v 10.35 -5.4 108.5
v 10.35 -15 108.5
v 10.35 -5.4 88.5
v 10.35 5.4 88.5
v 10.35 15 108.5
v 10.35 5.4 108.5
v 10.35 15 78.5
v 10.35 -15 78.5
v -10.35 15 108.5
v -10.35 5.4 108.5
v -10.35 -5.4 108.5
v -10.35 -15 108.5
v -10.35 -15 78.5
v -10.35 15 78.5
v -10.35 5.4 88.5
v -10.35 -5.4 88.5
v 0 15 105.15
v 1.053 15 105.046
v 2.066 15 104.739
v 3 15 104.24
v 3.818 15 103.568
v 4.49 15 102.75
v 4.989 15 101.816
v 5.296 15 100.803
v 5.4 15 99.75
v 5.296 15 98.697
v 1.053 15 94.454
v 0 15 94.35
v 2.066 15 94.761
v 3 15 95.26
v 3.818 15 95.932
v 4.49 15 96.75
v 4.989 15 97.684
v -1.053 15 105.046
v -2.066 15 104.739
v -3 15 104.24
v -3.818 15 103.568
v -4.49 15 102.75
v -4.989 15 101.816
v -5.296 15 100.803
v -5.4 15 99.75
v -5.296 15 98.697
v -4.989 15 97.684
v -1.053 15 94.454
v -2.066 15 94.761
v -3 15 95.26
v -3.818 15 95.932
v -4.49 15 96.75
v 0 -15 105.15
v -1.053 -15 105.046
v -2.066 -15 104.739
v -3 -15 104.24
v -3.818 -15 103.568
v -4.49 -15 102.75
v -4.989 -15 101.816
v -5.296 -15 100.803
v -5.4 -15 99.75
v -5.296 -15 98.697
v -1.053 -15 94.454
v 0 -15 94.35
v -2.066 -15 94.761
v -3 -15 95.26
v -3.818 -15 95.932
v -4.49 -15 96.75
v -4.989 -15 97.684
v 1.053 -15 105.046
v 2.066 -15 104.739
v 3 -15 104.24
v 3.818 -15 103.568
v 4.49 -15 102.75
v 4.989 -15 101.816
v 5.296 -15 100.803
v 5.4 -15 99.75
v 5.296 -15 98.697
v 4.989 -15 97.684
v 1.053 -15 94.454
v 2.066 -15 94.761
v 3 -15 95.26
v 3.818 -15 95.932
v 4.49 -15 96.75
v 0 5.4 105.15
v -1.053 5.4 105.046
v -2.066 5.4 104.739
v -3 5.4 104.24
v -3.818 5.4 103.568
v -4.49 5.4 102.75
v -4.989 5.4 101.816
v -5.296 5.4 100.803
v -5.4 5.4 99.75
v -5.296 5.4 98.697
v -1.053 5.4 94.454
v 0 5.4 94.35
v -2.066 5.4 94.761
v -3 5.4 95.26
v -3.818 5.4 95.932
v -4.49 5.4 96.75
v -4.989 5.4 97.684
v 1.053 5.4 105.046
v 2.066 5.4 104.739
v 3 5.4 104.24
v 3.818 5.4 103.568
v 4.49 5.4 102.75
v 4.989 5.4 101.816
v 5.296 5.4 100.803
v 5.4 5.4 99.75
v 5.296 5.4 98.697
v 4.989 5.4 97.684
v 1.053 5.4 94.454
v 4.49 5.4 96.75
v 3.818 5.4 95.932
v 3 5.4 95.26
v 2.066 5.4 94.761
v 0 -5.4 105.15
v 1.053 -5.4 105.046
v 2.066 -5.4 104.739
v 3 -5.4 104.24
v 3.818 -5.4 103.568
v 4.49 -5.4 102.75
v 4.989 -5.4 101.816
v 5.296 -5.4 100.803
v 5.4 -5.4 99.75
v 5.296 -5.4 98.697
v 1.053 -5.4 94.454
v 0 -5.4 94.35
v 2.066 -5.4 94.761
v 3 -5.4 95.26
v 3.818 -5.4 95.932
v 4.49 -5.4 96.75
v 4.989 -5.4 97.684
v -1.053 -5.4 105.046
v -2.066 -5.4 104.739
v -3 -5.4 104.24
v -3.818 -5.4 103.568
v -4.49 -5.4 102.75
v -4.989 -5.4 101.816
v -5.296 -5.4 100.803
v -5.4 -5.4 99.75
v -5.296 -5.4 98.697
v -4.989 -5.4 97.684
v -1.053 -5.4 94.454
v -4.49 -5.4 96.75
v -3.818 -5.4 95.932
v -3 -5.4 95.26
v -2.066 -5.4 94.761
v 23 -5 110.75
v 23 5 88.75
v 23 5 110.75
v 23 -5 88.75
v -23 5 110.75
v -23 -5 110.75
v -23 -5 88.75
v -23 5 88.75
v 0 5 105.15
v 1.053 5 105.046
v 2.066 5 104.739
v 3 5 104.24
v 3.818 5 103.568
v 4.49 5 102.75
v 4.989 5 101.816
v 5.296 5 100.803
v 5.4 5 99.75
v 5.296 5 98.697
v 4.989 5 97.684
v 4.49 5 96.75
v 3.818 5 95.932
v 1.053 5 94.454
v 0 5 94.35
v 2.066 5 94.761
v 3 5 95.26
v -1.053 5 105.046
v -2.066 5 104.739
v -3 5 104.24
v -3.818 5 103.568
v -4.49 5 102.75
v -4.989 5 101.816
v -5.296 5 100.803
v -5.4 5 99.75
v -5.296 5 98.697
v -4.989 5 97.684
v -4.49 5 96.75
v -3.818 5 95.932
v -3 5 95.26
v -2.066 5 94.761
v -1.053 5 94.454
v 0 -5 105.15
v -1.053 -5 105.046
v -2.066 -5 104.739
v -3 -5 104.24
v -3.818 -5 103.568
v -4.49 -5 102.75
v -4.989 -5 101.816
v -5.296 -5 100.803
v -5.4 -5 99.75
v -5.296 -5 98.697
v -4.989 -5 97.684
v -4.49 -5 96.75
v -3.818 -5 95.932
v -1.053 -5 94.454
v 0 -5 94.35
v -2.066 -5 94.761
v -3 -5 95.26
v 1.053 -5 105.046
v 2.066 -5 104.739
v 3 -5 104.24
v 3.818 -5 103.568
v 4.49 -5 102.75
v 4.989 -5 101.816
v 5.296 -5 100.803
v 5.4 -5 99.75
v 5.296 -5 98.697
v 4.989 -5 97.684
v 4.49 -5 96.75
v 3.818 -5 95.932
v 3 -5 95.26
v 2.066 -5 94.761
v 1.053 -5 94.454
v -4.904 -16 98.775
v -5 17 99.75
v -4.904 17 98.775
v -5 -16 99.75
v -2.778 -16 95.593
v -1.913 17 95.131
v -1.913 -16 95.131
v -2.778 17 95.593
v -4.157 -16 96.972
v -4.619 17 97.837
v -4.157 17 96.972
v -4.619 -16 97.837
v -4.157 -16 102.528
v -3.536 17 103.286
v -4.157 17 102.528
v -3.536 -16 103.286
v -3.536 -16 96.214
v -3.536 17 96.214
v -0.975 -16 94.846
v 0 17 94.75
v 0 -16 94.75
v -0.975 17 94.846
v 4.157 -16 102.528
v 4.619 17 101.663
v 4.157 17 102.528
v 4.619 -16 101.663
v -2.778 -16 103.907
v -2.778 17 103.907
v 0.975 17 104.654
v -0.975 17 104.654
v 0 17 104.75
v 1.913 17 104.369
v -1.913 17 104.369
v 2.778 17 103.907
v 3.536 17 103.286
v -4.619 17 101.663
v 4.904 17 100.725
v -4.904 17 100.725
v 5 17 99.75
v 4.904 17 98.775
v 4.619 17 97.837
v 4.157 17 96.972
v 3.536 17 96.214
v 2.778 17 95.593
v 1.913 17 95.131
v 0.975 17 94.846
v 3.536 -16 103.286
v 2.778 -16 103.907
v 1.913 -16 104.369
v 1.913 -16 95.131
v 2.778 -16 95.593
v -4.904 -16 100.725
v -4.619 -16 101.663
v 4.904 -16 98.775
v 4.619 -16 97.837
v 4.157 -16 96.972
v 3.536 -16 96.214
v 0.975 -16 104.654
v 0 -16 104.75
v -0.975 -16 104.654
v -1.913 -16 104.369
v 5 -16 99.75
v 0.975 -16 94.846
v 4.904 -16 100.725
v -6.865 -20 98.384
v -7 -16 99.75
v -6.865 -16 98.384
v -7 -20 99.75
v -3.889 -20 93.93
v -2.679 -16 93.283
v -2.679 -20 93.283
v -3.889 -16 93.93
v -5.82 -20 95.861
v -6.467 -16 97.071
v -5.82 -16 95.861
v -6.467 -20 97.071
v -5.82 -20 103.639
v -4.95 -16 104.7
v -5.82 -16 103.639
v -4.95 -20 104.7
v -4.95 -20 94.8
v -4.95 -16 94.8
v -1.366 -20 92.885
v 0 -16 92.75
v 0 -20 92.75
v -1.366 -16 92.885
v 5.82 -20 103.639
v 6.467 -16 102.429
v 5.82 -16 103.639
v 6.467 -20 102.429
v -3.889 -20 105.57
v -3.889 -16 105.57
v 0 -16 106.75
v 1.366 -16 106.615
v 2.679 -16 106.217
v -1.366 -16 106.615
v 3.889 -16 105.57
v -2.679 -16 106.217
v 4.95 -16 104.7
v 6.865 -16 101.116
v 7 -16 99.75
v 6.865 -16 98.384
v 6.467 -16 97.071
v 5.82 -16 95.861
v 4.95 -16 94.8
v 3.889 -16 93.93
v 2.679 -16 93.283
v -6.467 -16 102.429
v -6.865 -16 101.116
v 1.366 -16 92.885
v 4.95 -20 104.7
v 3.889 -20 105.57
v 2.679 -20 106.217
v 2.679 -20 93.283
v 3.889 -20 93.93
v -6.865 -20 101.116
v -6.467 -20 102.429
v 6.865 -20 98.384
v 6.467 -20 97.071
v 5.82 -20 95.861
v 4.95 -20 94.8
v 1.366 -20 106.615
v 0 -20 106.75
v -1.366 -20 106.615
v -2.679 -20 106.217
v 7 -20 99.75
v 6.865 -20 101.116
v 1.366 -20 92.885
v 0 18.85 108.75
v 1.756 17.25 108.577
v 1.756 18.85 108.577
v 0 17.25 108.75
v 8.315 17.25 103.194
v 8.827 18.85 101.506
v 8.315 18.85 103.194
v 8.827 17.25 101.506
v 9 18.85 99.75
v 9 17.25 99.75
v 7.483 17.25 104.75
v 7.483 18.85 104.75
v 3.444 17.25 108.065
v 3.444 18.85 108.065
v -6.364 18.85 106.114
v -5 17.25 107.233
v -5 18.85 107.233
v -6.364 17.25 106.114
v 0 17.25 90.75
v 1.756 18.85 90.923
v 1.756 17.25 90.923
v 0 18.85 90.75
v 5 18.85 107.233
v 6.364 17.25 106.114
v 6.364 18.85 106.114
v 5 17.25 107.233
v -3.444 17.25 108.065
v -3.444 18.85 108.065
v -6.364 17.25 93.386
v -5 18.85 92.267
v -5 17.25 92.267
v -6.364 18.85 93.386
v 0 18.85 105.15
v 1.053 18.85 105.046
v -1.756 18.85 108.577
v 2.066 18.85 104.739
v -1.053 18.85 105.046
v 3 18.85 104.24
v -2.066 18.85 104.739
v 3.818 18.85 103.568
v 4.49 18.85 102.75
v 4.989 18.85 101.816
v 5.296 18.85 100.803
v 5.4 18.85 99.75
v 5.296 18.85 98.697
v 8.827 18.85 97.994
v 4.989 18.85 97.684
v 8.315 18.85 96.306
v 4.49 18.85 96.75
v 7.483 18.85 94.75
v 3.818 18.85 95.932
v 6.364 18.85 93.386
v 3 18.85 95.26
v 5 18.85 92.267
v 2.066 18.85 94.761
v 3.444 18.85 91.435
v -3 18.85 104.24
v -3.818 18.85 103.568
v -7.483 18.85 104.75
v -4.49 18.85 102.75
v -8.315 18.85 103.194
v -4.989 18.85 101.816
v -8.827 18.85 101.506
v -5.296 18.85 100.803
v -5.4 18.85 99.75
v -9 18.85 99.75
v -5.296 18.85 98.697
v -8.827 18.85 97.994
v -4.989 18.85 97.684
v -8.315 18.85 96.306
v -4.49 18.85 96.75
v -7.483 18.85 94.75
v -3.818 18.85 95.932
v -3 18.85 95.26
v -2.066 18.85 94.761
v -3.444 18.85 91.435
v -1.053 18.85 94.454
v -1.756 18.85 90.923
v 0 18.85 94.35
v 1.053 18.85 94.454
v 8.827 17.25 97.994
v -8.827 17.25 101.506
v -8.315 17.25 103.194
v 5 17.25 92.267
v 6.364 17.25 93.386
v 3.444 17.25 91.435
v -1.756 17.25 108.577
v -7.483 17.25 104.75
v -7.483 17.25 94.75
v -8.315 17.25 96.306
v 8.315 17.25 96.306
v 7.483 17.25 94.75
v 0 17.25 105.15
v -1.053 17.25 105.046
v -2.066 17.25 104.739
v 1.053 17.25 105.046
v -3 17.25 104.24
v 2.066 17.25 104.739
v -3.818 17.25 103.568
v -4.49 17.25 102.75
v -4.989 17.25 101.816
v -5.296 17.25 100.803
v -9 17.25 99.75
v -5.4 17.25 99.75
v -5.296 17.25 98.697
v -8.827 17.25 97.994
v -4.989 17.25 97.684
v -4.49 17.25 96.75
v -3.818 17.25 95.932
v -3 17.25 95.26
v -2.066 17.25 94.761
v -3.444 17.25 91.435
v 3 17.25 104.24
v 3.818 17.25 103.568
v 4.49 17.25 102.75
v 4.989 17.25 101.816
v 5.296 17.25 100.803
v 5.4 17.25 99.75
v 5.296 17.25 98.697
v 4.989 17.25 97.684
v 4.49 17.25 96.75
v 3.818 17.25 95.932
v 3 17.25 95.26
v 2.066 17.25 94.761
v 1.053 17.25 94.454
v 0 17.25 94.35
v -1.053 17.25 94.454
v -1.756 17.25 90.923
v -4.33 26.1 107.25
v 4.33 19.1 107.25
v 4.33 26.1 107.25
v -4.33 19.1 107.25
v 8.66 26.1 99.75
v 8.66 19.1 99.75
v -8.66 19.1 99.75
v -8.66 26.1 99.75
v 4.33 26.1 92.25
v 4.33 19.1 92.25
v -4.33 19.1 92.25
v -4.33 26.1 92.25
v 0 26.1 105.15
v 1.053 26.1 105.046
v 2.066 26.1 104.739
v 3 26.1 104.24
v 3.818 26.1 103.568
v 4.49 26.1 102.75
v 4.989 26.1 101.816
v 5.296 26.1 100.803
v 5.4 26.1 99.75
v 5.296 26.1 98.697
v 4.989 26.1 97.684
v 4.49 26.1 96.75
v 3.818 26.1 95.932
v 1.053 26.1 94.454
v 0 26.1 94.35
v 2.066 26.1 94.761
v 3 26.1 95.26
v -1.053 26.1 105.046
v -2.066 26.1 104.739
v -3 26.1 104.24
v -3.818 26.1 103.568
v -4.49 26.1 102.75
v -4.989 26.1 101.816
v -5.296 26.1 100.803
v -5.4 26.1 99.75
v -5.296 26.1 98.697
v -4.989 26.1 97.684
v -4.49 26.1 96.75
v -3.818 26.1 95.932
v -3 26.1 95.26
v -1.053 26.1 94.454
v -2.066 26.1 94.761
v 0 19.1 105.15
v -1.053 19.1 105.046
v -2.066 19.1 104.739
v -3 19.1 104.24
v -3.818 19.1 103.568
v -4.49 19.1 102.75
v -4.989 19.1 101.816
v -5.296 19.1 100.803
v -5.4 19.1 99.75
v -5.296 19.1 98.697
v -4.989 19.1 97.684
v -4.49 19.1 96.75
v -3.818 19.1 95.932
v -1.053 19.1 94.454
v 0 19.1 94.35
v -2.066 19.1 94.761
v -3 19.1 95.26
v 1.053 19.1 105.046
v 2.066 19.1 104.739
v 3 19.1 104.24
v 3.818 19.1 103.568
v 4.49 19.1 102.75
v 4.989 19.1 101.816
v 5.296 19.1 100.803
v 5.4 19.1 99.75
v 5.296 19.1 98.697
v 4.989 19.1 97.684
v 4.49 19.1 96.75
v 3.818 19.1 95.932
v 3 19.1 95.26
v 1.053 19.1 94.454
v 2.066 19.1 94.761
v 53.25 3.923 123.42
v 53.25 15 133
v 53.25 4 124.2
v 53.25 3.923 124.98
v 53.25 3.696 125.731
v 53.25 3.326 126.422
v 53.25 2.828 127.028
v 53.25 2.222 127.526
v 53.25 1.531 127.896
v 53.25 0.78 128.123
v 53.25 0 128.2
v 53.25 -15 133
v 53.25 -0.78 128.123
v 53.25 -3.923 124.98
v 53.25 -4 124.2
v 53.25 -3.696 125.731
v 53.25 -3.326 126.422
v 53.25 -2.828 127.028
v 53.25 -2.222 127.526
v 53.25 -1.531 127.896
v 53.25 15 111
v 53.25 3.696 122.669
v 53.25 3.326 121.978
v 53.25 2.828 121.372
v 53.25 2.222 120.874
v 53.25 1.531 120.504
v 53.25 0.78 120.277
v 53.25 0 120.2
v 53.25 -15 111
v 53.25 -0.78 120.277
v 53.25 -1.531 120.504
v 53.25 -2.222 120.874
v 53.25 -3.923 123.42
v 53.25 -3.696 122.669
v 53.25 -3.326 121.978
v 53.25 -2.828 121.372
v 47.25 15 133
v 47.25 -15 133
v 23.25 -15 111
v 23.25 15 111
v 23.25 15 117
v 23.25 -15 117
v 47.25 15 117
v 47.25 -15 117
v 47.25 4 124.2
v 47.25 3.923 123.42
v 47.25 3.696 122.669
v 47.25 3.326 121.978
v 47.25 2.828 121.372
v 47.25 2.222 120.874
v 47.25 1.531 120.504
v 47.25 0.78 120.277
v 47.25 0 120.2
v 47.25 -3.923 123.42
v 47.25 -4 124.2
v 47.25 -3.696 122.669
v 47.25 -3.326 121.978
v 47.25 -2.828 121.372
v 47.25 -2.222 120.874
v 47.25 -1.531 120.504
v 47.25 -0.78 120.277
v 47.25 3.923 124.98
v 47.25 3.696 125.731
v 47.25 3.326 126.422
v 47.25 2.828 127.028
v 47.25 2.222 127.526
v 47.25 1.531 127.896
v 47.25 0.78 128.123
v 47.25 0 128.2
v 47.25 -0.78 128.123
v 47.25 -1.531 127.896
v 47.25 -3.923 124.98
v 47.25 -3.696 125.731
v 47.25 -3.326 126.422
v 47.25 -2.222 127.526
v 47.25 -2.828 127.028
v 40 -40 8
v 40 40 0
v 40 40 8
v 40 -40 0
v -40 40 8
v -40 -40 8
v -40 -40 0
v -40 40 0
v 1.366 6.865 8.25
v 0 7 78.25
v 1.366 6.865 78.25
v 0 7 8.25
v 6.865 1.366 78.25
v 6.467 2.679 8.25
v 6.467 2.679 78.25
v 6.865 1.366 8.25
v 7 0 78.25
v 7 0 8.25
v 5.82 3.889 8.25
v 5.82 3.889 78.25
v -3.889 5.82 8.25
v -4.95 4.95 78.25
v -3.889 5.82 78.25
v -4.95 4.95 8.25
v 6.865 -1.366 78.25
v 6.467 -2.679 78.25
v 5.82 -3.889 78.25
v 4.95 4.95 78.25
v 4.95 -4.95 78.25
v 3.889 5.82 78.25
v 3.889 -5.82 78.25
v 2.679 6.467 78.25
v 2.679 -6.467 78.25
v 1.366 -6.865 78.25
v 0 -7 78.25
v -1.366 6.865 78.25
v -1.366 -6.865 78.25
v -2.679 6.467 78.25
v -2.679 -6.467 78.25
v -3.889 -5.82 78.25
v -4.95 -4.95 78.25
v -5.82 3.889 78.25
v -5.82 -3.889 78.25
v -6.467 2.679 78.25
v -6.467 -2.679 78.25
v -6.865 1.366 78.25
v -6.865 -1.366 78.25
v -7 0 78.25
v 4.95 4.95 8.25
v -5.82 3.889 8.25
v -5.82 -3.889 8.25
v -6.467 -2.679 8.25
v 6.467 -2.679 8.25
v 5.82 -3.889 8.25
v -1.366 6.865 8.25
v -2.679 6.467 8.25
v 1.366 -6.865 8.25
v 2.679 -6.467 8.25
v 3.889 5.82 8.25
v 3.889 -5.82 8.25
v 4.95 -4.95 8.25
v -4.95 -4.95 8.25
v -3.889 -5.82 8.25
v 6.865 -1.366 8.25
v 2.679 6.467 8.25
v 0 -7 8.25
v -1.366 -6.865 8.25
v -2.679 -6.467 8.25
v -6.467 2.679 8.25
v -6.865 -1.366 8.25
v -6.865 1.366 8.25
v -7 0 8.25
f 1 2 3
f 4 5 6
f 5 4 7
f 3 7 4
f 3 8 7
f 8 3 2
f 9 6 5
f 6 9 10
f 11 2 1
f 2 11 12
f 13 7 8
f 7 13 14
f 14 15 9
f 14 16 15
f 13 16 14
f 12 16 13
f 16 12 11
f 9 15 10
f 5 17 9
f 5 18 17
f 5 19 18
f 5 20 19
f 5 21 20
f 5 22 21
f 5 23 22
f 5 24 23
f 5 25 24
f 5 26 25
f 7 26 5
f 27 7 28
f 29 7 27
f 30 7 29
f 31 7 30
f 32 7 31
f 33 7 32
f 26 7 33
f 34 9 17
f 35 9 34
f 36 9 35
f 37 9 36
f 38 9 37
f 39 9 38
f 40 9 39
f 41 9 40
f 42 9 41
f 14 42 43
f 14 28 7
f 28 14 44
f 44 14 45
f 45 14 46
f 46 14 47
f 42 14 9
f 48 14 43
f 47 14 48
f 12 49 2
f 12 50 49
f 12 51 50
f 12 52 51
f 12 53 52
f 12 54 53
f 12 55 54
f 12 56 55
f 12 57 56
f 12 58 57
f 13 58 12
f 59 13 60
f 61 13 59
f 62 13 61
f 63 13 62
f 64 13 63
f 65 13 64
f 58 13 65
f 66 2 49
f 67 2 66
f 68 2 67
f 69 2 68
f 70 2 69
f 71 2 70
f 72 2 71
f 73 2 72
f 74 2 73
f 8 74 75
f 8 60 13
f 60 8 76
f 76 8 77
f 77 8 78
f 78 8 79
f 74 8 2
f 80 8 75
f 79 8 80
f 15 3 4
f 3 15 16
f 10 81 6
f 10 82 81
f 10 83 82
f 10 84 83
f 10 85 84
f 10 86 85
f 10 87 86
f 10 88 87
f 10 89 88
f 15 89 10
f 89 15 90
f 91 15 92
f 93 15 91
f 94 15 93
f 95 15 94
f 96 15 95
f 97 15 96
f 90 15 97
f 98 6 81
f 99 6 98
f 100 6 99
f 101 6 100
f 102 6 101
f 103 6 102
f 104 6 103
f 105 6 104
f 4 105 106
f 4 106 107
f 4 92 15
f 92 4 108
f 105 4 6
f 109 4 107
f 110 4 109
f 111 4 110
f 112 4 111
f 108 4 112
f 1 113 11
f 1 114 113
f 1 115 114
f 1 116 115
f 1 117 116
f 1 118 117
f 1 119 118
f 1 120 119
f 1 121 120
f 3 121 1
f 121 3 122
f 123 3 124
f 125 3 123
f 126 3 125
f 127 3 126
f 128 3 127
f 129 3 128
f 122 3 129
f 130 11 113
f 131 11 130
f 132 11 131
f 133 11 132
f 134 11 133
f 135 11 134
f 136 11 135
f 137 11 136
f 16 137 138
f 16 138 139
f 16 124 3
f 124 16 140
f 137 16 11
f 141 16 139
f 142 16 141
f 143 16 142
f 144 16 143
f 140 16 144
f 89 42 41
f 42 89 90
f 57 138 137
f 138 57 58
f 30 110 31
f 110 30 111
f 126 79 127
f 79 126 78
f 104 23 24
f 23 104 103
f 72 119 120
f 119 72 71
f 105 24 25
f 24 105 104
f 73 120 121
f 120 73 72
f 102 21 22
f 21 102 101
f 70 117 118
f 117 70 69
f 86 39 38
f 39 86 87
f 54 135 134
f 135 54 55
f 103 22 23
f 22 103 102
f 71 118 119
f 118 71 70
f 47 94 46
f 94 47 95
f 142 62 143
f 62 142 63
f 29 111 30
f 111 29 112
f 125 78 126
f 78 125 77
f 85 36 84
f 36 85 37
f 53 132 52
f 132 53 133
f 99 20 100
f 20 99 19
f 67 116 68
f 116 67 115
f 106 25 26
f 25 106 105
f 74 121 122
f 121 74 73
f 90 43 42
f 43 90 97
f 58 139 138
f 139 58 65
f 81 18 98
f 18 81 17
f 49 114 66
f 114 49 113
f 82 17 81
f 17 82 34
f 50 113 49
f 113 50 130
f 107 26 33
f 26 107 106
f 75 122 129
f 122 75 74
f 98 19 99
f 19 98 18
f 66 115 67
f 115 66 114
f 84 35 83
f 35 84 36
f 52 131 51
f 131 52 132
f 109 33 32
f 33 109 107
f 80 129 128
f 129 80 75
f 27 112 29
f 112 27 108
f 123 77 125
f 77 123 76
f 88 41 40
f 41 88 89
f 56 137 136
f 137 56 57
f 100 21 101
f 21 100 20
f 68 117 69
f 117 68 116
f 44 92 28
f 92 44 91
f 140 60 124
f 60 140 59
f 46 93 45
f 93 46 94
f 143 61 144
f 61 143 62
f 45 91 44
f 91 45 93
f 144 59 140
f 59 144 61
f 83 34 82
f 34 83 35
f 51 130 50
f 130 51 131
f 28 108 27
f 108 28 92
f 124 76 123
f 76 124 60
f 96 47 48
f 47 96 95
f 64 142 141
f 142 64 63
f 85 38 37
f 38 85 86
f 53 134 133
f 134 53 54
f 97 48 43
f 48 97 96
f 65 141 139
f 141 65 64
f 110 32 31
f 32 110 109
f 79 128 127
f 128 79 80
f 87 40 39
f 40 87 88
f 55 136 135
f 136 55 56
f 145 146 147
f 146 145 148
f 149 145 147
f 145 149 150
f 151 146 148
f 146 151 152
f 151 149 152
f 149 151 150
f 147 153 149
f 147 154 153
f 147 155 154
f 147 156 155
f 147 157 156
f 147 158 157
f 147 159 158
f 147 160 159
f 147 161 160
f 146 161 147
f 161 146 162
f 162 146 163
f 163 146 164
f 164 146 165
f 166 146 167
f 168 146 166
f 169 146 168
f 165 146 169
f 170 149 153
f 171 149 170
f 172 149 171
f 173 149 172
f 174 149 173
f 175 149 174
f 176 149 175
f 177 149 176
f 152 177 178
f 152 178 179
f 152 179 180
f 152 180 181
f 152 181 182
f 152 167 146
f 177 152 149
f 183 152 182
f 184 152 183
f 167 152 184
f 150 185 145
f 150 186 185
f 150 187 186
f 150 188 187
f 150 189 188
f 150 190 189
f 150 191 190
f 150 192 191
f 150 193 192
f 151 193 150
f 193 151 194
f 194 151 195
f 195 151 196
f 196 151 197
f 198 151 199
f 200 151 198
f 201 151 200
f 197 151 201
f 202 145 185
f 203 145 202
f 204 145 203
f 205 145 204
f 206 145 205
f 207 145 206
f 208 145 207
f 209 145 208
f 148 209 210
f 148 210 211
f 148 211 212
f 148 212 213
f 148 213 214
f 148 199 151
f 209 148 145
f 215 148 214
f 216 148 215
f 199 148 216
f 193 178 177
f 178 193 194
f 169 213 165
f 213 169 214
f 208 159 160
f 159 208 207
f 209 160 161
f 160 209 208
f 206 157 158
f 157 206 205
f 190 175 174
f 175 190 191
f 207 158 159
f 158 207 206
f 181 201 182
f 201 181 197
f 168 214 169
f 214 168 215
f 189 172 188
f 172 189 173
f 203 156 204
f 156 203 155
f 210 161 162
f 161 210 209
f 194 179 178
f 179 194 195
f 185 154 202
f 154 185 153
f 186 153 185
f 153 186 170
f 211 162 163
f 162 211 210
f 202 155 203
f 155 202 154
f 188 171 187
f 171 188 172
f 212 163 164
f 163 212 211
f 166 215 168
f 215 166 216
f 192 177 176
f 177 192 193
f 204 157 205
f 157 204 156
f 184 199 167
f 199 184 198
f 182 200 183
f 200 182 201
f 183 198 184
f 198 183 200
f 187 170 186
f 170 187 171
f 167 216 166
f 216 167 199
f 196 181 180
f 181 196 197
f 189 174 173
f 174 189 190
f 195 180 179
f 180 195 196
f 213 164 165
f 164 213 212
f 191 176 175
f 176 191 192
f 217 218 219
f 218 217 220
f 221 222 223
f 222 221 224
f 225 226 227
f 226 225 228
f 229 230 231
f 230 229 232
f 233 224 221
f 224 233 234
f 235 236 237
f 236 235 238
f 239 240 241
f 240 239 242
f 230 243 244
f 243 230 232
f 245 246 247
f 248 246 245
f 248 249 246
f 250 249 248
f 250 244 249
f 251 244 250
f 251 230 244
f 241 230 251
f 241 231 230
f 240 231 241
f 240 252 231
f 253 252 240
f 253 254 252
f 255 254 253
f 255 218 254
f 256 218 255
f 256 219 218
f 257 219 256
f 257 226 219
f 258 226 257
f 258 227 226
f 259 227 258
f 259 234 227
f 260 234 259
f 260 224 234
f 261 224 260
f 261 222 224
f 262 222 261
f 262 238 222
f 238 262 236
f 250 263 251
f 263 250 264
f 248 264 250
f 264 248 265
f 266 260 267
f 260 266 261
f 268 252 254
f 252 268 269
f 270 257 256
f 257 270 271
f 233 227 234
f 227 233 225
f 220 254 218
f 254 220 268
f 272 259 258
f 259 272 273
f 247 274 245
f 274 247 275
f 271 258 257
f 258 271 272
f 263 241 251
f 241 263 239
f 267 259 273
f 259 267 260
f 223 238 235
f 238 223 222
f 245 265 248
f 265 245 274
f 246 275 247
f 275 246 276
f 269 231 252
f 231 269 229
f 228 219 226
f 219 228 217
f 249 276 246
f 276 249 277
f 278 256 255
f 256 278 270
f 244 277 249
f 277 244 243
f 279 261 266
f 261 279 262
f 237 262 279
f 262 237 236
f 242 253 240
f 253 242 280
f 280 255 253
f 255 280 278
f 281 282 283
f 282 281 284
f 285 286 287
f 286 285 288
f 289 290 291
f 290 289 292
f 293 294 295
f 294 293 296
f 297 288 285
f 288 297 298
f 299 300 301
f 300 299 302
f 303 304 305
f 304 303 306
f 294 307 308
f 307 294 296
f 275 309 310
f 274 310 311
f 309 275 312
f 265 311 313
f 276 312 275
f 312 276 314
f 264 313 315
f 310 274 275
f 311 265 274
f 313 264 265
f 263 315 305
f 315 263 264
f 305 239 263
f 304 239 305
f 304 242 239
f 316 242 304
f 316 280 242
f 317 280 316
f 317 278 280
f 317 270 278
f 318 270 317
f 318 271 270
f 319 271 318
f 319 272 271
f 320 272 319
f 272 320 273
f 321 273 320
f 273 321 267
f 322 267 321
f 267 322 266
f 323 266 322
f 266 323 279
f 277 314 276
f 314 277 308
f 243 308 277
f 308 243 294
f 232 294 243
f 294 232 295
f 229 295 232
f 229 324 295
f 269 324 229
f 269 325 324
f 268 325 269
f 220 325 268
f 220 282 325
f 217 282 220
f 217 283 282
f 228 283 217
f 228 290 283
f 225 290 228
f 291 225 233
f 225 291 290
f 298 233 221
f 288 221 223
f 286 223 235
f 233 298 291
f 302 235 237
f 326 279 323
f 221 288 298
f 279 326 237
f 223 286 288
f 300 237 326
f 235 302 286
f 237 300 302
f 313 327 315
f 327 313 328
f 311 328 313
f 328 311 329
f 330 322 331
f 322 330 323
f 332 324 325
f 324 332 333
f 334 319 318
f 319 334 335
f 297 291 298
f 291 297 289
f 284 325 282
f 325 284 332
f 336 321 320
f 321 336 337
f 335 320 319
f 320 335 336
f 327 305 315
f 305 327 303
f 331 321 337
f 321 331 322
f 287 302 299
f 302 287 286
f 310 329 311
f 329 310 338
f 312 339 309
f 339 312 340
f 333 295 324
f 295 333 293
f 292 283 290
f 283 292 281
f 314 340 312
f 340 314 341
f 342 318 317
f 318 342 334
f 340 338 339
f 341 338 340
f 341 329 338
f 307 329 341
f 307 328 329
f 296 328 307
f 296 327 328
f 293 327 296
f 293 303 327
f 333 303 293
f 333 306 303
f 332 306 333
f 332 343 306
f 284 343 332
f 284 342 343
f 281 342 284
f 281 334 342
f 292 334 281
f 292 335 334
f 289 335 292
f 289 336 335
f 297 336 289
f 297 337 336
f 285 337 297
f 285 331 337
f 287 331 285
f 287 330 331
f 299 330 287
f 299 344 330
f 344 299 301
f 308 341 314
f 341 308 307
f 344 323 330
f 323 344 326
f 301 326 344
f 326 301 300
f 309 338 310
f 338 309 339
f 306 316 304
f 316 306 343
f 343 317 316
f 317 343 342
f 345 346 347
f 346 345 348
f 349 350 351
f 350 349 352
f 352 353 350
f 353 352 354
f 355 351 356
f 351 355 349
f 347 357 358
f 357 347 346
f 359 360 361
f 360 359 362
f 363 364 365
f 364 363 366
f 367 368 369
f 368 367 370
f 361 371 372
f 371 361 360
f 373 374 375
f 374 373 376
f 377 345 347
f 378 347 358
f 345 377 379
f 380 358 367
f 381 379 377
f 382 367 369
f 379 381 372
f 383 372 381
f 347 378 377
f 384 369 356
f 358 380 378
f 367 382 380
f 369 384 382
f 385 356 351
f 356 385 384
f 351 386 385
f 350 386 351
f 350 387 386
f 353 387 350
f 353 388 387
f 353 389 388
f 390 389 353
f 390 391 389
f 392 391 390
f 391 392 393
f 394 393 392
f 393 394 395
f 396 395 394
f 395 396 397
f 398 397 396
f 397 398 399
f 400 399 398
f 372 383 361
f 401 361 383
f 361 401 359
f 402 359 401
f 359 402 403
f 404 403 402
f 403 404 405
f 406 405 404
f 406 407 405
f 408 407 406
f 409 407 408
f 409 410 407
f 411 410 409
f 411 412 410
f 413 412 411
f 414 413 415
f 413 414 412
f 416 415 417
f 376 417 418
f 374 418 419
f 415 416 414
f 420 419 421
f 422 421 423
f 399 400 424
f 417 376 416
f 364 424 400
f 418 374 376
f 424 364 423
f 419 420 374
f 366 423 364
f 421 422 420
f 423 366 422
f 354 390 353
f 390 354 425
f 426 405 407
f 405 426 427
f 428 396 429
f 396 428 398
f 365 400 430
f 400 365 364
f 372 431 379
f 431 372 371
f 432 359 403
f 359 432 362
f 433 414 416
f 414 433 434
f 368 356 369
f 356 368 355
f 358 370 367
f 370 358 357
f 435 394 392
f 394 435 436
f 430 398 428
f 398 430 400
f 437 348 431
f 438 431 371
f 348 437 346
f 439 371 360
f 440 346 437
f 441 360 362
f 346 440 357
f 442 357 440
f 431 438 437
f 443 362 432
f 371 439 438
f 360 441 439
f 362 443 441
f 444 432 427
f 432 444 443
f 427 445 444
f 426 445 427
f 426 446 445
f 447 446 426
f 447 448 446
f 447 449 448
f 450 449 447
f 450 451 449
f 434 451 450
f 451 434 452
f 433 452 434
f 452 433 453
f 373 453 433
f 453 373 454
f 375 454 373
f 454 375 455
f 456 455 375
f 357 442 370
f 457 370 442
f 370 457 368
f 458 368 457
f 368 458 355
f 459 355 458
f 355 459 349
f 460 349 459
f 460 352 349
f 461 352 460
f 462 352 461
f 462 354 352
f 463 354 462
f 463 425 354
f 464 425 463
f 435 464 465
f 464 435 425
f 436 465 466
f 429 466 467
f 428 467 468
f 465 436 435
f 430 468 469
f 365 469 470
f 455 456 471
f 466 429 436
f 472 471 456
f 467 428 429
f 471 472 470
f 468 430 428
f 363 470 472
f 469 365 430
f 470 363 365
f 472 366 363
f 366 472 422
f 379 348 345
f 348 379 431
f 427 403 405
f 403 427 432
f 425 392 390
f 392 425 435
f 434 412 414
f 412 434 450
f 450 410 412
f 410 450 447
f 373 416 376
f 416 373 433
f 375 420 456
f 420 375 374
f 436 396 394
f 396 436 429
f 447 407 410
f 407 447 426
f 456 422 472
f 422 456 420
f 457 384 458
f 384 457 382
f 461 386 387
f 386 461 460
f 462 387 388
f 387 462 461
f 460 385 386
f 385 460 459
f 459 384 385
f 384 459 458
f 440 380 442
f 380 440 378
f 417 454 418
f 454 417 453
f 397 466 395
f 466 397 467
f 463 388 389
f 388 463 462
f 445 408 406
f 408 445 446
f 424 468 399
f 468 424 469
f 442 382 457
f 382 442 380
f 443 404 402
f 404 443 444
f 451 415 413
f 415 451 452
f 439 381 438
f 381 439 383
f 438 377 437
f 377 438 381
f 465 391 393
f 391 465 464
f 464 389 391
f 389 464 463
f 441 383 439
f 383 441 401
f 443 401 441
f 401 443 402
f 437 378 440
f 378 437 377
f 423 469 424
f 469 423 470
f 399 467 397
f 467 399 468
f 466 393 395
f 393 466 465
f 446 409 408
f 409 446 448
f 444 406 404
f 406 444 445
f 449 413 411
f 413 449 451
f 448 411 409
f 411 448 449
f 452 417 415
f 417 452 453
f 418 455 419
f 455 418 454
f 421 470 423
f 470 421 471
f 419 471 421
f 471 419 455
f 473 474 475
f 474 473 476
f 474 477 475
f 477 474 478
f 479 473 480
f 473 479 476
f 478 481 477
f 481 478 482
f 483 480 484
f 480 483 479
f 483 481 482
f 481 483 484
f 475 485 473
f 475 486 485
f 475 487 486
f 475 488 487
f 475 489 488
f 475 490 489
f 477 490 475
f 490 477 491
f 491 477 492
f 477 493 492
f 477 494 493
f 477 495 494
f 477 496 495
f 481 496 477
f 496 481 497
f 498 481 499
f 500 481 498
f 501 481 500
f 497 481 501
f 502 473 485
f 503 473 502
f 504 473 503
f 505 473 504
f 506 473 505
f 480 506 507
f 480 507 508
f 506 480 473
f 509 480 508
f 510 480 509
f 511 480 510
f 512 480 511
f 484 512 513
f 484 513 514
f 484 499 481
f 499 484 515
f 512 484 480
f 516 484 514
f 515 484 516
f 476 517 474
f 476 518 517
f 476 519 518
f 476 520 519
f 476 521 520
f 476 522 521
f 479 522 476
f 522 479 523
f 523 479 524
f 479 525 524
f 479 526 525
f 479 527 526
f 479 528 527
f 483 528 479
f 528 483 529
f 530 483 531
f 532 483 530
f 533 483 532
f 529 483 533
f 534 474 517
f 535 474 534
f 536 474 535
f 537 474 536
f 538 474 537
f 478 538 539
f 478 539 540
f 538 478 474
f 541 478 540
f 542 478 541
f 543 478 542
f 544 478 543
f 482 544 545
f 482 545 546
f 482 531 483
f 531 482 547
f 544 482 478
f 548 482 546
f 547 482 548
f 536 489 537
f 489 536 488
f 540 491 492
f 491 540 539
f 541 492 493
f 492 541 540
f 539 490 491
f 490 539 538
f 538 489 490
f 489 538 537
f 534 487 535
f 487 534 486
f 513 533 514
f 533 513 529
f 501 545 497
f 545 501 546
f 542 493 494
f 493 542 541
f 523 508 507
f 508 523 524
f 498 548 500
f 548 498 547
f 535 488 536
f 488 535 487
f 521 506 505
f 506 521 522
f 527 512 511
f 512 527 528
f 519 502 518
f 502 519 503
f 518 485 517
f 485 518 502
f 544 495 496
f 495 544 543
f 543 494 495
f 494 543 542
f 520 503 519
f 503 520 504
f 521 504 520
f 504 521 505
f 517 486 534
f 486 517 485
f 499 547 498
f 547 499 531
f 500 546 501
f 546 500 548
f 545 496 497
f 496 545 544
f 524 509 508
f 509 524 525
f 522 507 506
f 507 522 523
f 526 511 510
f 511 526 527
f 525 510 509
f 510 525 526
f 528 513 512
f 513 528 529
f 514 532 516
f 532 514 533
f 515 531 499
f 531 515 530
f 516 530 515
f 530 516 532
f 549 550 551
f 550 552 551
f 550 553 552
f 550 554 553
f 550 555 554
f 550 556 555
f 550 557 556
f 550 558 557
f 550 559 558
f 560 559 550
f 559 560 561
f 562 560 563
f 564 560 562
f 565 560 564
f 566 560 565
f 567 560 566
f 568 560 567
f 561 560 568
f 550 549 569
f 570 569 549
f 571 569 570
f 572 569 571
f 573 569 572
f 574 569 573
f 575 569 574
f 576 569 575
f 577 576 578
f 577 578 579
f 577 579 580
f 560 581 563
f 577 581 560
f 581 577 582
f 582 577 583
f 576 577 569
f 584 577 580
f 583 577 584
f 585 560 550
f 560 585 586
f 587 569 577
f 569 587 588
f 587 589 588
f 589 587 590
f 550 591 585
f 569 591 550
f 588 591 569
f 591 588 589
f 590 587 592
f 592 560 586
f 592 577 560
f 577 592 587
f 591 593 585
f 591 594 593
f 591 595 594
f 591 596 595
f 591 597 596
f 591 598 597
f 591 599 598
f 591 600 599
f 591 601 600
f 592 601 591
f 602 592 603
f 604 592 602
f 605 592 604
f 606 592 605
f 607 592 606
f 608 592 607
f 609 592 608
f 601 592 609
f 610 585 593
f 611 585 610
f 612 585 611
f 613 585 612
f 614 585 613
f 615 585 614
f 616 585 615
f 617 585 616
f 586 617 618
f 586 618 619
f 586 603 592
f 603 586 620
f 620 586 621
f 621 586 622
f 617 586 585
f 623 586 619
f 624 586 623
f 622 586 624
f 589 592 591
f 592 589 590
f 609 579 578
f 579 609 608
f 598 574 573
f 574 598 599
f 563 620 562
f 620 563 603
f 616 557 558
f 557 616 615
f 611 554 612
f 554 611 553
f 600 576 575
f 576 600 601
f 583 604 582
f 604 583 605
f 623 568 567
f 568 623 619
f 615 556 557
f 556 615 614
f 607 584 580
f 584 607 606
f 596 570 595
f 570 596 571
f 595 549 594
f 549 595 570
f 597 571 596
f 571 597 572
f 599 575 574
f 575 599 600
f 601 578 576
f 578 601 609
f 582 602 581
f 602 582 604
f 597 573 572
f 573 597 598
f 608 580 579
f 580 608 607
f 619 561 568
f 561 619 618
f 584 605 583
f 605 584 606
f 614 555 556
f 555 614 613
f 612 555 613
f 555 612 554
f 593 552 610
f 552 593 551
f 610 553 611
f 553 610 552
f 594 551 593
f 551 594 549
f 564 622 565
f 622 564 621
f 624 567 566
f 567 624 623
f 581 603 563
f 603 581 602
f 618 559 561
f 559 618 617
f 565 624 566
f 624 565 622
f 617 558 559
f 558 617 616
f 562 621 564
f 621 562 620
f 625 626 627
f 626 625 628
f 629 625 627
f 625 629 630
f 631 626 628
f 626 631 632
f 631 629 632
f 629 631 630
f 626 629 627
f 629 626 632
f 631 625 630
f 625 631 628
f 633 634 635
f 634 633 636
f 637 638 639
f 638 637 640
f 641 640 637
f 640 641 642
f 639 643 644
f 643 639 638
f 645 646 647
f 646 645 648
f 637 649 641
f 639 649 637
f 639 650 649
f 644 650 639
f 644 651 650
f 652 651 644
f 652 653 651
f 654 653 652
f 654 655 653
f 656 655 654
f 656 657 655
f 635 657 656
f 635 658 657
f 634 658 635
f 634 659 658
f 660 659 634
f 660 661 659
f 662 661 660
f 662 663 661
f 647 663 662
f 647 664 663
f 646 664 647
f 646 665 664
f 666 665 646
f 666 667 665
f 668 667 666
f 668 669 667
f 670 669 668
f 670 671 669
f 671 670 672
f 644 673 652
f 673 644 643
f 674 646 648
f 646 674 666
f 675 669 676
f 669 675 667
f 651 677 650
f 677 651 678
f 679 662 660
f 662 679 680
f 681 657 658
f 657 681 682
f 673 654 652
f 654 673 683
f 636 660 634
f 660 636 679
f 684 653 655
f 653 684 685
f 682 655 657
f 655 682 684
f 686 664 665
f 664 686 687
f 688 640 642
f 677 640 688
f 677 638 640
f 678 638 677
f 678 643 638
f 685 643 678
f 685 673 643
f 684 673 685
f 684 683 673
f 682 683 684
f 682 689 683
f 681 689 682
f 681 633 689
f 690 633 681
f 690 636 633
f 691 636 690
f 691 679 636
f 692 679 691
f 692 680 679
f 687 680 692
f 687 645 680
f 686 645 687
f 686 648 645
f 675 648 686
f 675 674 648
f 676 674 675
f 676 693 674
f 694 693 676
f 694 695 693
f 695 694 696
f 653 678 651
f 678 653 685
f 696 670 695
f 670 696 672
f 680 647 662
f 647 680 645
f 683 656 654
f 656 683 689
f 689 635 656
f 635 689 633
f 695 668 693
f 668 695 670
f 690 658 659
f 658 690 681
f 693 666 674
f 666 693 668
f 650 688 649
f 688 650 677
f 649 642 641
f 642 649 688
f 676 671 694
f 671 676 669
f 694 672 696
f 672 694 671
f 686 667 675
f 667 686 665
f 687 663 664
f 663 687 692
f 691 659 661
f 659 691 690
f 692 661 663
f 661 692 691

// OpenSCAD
$fn = 32;

// ------------------------------------------------------------------------
// Lamp arm: column d14 x 70 mm, arm 46 mm
// Every part is its own module, assembly() places every instance.
// ------------------------------------------------------------------------

// --- part 1 ---
module lamp_base() {
  difference() {
    translate([-40, -40, 0]) cube([80, 80, 8]);
  }
}

// --- part 2 ---
module lamp_column() {
  cylinder(h = 70, d = 14);
}

// --- part 3 ---
module head_fork() {
  difference() {
    translate([-10.35, -15, 0]) cube([20.7, 30, 30]);
    translate([-11.35, -5.4, 10]) cube([22.7, 10.8, 21]);
    translate([0, 0, 21.25]) rotate([90, 0, 0]) cylinder(h = 32, d = 10.8, center = true);
  }
}

// --- part 4 ---
module lamp_arm() {
  difference() {
    translate([-23, -5, 0]) cube([46, 10, 22]);
    translate([0, 0, 11]) rotate([90, 0, 0]) cylinder(h = 12, d = 10.8, center = true);
  }
}

// --- part 5 ---
module arm_pin() {
  rotate([0, 90, 0]) cylinder(h = 34, d = 10, center = true);
  translate([-20, 0, 0]) rotate([0, 90, 0]) cylinder(h = 4, d = 14);
}

// --- part 6 ---
module arm_washer() {
  difference() {
      translate([0, 0, 0]) cylinder(h = 1.6, d = 18);
      translate([0, 0, -1]) cylinder(h = 3.6, d = 10.8);
    }
}

// --- part 7 ---
module arm_nut() {
  difference() {
    linear_extrude(height = 7) polygon(points = [[8.66, 0], [4.33, 7.5], [-4.33, 7.5], [-8.66, 0], [-4.33, -7.5], [4.33, -7.5]]);
    translate([0, 0, -1]) cylinder(h = 9, d = 10.8);
  }
}

// --- part 8 ---
module shade_bracket() {
  difference() {
    translate([-15, -15, 0]) cube([30, 30, 22]);
    translate([-16, -16, 6]) cube([25, 32, 17]);
    translate([12, 0, 13.2]) rotate([0, 90, 0]) cylinder(h = 8, d = 8, center = true);
  }
}

// --- assembly ---
module assembly() {
  color([0.80, 0.24, 0.20]) translate([0, 0, 0]) rotate([0, 0, 0]) lamp_base();
  color([0.20, 0.45, 0.75]) translate([0, 0, 8.25]) rotate([0, 0, 0]) lamp_column();
  color([0.25, 0.62, 0.32]) translate([0, 0, 78.5]) rotate([0, 0, 0]) head_fork();
  color([0.92, 0.70, 0.18]) translate([0, 0, 88.75]) rotate([0, 0, 0]) lamp_arm();
  color([0.58, 0.35, 0.70]) translate([0, 0, 99.75]) rotate([0, 0, 90]) arm_pin();
  color([0.16, 0.66, 0.66]) translate([0, 18.85, 99.75]) rotate([90, 0, 0]) arm_washer();
  color([0.85, 0.48, 0.18]) translate([0, 26.1, 99.75]) rotate([90, 0, 0]) arm_nut();
  color([0.55, 0.60, 0.65]) translate([38.25, 0, 111]) rotate([0, 0, 0]) shade_bracket();
}

assembly();
